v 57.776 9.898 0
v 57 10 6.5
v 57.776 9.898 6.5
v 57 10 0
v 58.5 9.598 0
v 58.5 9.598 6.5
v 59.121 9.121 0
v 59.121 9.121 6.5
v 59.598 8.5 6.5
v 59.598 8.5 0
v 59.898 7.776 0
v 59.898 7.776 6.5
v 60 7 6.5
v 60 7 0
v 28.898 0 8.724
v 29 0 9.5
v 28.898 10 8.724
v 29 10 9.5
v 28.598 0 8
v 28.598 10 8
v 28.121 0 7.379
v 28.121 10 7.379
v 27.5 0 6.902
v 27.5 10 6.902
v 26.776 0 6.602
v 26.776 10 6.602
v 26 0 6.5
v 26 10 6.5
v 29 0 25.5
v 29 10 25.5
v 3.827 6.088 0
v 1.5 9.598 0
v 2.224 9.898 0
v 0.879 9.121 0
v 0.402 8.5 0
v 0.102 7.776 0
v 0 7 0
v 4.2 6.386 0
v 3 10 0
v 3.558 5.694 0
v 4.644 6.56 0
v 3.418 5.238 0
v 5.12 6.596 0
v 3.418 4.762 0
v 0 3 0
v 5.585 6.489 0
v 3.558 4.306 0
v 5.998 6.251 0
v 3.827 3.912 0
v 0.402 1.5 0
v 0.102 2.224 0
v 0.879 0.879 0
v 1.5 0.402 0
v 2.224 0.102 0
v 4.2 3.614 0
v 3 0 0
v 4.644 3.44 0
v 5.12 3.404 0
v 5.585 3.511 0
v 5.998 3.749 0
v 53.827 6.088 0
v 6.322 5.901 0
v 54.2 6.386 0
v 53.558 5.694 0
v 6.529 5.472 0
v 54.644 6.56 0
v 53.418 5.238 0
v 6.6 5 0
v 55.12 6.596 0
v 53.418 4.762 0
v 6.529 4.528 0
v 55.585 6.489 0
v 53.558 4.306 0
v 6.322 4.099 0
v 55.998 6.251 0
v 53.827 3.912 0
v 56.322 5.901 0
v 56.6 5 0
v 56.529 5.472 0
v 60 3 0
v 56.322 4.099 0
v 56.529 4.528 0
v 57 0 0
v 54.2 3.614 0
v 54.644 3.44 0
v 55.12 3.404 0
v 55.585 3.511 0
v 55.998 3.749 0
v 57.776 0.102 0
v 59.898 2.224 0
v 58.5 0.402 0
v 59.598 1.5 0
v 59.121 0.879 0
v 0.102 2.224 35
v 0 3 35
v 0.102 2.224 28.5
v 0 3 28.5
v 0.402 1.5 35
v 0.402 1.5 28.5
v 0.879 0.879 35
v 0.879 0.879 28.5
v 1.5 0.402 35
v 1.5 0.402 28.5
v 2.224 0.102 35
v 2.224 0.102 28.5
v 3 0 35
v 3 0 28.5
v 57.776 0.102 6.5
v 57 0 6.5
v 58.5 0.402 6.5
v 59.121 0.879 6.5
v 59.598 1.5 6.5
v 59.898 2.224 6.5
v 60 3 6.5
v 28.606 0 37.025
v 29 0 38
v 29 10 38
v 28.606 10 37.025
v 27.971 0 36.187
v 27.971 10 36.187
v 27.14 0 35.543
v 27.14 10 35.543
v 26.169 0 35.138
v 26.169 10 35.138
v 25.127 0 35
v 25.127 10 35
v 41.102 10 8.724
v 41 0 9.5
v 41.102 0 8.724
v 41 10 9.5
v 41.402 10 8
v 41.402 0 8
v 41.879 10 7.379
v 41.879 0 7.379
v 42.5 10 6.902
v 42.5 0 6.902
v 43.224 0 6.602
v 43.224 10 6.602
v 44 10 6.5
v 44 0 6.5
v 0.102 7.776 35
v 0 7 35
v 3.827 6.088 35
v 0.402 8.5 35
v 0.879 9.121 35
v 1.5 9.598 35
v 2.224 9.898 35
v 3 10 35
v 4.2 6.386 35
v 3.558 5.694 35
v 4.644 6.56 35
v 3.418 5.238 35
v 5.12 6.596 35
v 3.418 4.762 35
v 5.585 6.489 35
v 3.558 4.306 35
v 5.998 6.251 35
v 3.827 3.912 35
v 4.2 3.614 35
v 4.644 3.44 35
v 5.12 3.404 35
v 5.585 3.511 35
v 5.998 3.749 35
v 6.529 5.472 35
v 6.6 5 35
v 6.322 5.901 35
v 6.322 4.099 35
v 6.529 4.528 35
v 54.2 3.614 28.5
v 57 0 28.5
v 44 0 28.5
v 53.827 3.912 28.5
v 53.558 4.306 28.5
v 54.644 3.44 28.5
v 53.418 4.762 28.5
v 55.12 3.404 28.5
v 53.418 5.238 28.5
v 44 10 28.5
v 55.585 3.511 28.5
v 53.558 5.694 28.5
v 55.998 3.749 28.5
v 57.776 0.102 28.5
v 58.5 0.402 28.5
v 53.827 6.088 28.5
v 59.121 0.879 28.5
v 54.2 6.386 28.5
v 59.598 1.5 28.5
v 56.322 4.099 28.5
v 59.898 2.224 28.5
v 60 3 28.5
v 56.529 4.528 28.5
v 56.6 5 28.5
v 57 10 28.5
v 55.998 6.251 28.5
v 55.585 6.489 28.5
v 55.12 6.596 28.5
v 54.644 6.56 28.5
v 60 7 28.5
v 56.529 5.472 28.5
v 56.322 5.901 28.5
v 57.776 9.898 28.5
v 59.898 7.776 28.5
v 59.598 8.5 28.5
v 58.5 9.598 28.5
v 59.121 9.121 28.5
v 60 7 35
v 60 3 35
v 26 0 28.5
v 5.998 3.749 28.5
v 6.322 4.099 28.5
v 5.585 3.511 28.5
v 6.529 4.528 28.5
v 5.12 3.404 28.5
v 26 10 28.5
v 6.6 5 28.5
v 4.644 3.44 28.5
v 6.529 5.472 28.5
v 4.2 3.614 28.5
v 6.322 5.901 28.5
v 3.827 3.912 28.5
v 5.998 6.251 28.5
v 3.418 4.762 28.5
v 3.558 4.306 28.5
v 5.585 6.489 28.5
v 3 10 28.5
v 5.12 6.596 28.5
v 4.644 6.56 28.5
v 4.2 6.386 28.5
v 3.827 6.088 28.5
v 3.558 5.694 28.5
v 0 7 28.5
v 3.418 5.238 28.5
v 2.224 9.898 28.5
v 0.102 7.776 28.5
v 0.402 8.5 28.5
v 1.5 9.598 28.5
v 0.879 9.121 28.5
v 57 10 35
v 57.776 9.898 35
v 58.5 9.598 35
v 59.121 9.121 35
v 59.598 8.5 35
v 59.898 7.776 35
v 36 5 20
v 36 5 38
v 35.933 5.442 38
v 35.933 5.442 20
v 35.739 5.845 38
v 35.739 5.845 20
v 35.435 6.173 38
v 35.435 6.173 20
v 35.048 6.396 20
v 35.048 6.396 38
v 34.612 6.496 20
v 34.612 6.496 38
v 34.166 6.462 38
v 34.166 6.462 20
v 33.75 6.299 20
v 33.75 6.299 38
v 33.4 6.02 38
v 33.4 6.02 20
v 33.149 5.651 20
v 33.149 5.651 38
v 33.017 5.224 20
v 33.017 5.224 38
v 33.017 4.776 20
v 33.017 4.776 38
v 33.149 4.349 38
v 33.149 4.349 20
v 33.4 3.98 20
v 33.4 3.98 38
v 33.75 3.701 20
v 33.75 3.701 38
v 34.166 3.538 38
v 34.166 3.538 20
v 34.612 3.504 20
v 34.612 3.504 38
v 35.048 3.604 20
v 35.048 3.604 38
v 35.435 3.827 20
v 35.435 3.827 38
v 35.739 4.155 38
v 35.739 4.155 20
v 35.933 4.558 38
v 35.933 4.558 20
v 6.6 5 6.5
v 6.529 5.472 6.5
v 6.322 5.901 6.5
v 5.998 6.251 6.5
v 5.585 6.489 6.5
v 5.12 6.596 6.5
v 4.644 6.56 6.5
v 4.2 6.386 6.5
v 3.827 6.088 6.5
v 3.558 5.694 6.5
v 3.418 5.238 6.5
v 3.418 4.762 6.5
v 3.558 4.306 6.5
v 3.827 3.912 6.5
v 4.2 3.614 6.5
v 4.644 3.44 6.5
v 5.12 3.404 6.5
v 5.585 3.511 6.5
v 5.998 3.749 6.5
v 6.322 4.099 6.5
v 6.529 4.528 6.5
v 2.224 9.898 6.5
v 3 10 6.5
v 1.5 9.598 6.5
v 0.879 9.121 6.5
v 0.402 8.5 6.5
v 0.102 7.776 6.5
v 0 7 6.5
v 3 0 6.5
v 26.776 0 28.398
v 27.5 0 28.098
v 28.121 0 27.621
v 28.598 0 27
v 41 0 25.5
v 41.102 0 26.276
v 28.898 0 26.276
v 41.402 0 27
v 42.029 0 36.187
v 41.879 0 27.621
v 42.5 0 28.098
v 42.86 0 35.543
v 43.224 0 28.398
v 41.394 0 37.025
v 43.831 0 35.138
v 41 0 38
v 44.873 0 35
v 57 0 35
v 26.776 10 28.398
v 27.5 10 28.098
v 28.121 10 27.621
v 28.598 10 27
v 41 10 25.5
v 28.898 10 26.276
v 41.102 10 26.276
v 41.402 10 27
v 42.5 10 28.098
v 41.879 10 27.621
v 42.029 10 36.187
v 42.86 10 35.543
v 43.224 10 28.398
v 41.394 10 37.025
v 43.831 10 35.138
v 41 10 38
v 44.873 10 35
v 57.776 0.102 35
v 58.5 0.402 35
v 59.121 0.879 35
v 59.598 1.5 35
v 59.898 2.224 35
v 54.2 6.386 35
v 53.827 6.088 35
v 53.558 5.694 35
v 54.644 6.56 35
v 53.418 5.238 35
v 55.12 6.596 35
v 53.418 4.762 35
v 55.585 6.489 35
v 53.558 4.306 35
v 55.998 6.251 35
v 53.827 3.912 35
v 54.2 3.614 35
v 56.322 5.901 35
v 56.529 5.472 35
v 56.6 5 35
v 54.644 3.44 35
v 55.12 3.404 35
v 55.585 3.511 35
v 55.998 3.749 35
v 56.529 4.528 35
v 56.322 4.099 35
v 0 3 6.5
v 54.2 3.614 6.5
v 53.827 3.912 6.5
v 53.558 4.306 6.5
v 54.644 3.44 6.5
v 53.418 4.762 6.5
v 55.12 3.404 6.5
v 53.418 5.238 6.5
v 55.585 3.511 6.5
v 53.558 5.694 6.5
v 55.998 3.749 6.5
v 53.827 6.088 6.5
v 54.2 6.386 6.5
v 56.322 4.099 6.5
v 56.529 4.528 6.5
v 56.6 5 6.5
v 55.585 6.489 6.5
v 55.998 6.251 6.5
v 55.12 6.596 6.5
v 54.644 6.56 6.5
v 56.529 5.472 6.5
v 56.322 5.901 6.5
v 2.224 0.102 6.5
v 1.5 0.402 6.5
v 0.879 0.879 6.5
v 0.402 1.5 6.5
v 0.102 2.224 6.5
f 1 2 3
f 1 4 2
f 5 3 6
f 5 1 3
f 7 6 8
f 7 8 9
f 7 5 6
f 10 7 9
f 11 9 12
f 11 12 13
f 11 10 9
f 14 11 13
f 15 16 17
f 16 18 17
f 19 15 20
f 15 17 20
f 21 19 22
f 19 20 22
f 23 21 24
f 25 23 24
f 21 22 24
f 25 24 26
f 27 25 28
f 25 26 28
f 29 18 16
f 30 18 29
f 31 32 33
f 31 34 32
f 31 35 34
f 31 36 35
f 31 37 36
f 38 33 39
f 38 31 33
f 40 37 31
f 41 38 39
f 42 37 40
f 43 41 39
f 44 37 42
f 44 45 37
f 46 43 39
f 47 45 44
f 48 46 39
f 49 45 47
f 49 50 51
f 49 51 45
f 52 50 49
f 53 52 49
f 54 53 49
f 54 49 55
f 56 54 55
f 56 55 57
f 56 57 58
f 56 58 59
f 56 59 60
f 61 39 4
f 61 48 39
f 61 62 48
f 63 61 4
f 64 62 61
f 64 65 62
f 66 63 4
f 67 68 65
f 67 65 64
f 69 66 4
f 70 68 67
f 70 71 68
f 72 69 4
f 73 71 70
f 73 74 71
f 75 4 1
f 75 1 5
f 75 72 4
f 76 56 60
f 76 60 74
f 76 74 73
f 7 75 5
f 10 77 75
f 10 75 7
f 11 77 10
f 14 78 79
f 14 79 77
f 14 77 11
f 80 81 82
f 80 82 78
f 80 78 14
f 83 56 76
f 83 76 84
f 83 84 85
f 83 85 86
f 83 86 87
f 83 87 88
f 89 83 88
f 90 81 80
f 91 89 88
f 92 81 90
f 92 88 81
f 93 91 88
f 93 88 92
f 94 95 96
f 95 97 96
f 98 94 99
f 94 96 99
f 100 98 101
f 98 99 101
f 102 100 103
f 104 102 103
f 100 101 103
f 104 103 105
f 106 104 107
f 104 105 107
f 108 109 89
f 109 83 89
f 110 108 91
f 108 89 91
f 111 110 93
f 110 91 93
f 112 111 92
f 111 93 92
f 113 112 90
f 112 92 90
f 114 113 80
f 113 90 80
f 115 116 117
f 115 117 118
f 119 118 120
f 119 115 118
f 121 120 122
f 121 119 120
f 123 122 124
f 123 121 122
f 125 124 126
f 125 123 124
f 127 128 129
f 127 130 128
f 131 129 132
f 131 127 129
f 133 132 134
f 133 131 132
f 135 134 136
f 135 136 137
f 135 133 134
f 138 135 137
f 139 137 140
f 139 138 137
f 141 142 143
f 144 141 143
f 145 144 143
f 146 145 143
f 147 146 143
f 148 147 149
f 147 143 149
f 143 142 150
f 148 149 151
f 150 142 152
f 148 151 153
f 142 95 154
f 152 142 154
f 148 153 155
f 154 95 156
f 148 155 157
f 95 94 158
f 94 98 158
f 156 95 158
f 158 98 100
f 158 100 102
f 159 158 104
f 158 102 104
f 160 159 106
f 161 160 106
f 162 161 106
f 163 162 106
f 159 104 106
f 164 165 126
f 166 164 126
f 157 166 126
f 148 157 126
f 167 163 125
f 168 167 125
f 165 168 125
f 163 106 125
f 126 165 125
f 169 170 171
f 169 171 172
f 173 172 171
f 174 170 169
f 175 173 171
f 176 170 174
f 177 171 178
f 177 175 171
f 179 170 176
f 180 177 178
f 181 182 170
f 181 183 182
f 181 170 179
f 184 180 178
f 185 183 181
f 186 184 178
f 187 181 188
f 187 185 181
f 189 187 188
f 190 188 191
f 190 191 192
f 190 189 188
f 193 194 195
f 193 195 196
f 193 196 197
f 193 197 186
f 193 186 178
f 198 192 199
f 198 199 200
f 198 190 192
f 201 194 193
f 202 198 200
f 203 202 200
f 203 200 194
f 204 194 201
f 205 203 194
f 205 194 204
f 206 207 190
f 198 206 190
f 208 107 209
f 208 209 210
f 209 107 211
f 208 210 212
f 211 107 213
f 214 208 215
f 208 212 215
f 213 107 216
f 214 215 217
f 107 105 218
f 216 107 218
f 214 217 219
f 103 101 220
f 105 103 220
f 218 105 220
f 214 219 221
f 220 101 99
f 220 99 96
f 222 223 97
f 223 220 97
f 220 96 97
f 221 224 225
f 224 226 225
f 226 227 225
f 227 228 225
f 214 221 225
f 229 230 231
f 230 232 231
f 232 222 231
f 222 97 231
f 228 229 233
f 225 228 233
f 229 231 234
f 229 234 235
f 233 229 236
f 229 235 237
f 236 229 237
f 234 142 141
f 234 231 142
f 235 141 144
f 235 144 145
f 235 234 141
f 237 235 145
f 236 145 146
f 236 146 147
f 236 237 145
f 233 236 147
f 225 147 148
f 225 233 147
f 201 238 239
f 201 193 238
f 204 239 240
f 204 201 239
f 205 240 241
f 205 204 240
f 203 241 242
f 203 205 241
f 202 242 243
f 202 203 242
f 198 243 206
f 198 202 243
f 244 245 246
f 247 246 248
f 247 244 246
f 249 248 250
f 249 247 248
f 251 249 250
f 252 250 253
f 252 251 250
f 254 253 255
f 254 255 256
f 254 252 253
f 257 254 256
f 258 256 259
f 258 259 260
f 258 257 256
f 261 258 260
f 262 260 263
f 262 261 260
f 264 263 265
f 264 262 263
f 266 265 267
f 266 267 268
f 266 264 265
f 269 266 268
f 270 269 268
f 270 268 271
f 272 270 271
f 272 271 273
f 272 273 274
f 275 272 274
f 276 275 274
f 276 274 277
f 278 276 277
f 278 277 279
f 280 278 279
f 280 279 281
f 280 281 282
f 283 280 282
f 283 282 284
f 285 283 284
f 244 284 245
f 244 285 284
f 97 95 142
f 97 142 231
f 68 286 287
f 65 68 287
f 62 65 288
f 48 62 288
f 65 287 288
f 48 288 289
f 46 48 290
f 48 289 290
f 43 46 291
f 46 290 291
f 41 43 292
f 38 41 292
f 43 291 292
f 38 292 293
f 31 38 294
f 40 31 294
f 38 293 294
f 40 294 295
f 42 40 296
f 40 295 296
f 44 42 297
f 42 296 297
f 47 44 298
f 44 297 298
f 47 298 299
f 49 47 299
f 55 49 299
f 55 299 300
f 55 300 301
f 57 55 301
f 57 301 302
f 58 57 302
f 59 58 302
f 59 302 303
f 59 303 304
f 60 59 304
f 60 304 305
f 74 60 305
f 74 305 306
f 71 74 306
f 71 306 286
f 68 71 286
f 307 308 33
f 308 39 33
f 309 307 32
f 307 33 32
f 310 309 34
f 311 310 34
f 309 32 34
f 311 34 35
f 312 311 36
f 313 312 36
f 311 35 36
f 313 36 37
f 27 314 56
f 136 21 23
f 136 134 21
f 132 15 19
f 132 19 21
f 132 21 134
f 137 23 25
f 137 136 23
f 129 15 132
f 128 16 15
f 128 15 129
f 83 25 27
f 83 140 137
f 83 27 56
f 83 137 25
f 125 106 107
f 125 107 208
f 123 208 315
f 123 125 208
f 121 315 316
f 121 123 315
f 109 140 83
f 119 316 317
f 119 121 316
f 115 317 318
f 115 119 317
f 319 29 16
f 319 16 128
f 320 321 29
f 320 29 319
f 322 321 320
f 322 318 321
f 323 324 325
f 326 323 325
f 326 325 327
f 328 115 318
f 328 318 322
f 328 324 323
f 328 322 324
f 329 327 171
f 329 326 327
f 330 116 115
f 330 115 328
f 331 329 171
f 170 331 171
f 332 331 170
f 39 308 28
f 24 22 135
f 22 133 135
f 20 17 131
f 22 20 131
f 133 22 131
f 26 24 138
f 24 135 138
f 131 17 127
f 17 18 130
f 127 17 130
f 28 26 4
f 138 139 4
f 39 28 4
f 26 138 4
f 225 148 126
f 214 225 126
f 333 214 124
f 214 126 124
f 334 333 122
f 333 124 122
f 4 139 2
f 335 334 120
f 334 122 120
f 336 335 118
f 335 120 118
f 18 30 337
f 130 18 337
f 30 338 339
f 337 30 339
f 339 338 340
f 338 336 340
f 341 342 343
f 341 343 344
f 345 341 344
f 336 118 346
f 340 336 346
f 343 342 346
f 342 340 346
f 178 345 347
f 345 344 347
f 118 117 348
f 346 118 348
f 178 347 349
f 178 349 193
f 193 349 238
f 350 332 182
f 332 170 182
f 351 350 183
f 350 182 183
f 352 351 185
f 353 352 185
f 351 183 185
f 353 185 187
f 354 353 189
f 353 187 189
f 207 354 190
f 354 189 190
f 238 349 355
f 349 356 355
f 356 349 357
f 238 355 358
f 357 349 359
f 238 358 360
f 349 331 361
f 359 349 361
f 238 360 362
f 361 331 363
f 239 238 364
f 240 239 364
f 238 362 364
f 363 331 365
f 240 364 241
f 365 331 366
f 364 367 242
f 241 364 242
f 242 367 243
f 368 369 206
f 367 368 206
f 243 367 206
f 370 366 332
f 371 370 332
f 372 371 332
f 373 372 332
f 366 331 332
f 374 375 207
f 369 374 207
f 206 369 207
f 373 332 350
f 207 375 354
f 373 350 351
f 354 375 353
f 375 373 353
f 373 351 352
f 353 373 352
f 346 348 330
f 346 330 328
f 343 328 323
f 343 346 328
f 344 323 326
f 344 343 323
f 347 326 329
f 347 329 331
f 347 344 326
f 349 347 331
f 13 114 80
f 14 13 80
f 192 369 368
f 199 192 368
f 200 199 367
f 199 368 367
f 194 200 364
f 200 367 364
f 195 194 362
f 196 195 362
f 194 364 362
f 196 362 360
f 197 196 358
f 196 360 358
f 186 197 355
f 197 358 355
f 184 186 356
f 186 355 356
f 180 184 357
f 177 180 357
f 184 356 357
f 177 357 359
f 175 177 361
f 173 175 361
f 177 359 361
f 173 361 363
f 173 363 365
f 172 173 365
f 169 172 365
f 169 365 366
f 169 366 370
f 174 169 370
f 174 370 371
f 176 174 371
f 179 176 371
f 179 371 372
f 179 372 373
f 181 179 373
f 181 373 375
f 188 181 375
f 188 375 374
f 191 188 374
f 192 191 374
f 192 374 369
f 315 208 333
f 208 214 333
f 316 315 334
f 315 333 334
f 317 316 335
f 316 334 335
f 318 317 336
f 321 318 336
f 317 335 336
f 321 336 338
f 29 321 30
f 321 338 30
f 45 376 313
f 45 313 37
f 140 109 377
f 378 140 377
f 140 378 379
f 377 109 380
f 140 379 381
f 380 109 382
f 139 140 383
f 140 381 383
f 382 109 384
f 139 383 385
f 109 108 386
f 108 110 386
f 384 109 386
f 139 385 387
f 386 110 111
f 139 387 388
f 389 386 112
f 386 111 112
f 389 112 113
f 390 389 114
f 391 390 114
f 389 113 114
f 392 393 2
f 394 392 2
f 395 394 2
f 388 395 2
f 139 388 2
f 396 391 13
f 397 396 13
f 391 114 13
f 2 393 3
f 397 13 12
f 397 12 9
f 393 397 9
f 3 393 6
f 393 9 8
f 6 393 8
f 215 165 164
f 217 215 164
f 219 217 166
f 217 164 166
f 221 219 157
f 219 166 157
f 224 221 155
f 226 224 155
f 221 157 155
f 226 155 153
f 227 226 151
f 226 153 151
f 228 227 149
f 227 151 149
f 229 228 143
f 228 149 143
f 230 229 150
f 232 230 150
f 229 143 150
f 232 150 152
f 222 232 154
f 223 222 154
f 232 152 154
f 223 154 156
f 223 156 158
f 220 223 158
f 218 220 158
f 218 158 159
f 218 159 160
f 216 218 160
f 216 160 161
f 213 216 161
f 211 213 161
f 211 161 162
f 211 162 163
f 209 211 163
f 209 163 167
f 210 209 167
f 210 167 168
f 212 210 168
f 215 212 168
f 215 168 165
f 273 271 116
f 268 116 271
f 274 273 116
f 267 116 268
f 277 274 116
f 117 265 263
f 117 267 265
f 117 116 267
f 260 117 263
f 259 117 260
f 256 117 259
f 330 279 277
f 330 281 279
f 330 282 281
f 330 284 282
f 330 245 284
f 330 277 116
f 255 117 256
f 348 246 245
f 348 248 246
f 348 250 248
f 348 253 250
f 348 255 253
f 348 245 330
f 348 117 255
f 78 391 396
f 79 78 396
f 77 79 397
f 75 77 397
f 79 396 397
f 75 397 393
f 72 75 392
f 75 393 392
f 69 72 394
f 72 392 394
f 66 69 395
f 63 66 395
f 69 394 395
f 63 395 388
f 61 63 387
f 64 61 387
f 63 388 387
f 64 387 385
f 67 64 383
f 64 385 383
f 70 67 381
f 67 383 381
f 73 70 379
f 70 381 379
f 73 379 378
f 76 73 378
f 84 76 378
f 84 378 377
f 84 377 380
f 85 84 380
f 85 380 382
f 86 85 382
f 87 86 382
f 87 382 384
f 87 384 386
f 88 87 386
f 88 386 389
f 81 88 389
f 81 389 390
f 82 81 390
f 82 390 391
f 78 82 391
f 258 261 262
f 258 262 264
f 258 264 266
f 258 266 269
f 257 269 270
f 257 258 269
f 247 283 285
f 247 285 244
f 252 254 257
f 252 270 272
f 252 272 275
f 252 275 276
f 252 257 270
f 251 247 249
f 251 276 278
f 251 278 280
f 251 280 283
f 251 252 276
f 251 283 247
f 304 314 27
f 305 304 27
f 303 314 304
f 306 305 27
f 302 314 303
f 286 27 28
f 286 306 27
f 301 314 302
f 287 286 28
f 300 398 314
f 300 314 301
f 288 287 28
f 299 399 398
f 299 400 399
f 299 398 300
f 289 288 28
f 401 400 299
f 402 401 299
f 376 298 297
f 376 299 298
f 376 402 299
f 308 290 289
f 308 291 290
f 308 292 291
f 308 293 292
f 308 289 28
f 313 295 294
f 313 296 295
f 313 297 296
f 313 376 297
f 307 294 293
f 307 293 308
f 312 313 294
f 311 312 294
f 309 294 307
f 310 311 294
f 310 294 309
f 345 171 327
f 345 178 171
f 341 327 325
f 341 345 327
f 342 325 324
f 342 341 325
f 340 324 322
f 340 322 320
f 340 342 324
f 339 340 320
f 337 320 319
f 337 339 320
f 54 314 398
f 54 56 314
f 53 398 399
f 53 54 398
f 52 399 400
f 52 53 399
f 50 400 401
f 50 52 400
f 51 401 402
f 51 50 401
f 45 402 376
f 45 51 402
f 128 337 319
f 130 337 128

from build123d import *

# Parameters (mm, degrees)
SKETCH1_W               = 60
SKETCH1_H               = 35
BOSS_EXTRUDE1_DEPTH     = 10
SKETCH2_W               = 22
SKETCH2_H               = 10
CUT_EXTRUDE1_DEPTH      = 19
SKETCH3_W               = 22
SKETCH3_H               = 10
CUT_EXTRUDE2_DEPTH      = 29
SKETCH5_R               = 1.6
CUT_EXTRUDE4_DEPTH      = 71.178344238
FILLET1_R               = 3
FILLET2_R               = 3
SKETCH7_W               = 12
SKETCH7_H               = 10
BOSS_EXTRUDE2_DEPTH     = 3
CUT_EXTRUDE5_DEPTH      = 3
CUT_EXTRUDE5_DEPTH_BACK = 15
SKETCH6_R               = 1.5
FILLET3_R               = 4


with BuildPart() as part:
    # Sketch1 → Boss-Extrude1 (new body)
    with BuildSketch(Plane(origin=(0, 0, 0), x_dir=(1, 0, 0), z_dir=(0, 1, 0))):
        with Locations((30, -17.5)):
            Rectangle(SKETCH1_W, SKETCH1_H)
    extrude(amount=BOSS_EXTRUDE1_DEPTH)

    # Sketch2 → Cut-Extrude1 (cut)
    with BuildSketch(Plane(origin=(60, 0, 0), x_dir=(0, 0, -1), z_dir=(1, 0, 0))):
        with Locations((-17.5, 5)):
            Rectangle(SKETCH2_W, SKETCH2_H)
    extrude(amount=-CUT_EXTRUDE1_DEPTH, mode=Mode.SUBTRACT)

    # Sketch3 → Cut-Extrude2 (cut)
    with BuildSketch(Plane.ZY):
        with Locations((17.5, 5)):
            Rectangle(SKETCH3_W, SKETCH3_H)
    extrude(amount=-CUT_EXTRUDE2_DEPTH, mode=Mode.SUBTRACT)

    # Sketch5 → Cut-Extrude4 (cut, through all)
    with BuildSketch(Plane.XY.offset(35)):
        with Locations((5, 5)):
            Circle(SKETCH5_R)
        with Locations((55, 5)):
            Circle(SKETCH5_R)
    extrude(amount=-CUT_EXTRUDE4_DEPTH, mode=Mode.SUBTRACT)

    # Fillet1
    fillet1_edges = [part.edges().sort_by_distance(p)[0] for p in [
        (60, 10, 31.75),
        (60, 0, 3.25),
        (60, 10, 3.25),
        (0, 0, 31.75),
        (0, 10, 31.75),
        (0, 10, 3.25),
        (60, 0, 31.75),
        (0, 0, 3.25),
    ]]
    fillet(fillet1_edges, radius=FILLET1_R)

    # Fillet2
    fillet2_edges = [part.edges().sort_by_distance(p)[0] for p in [
        (41, 5, 28.5),
        (41, 5, 6.5),
        (29, 5, 6.5),
        (29, 5, 28.5),
    ]]
    fillet(fillet2_edges, radius=FILLET2_R)

    # Sketch7 → Boss-Extrude2 (add)
    with BuildSketch(Plane.XY.offset(35)):
        with Locations((35, 5)):
            Rectangle(SKETCH7_W, SKETCH7_H)
    extrude(amount=BOSS_EXTRUDE2_DEPTH)

    # Sketch6 → Cut-Extrude5 (cut, two sides: drawn at the far end of the back side and taken through both)
    with BuildSketch(Plane.XY.offset(35).offset(-CUT_EXTRUDE5_DEPTH_BACK)):
        with Locations((34.5, 5)):
            Circle(SKETCH6_R)
    extrude(amount=CUT_EXTRUDE5_DEPTH + CUT_EXTRUDE5_DEPTH_BACK, mode=Mode.SUBTRACT)

    # Fillet3
    # the kernel refuses this fillet: 4 mm, written as the material it adds along each edge
    with BuildSketch(Plane(origin=(41, 10, 35), x_dir=(0, 0, 1), z_dir=(0, -1, 0))) as fillet3_piece_1:
        with BuildLine():
            CenterArc((4, -3.872983346), FILLET3_R, 104.477512186, 75.522487814)
            Line((0, -3.872983346), (-0.08, -3.872983346))
            Line((-0.08, -3.872983346), (-0.08, 0))
            Line((-0.08, 0), (0, 0.08))
            ThreePointArc((0, 0.08), (1.5, 0.08), (2.98, 0.077459667))
            Line((2.98, 0.077459667), (3, 0))
        make_face()
    extrude(amount=10)
    with BuildSketch(Plane(origin=(29, 0, 35), x_dir=(-1, 0, 0), z_dir=(0, 1, 0))) as fillet3_piece_2:
        with BuildLine():
            CenterArc((3.872983346, 4), FILLET3_R, 194.477512186, 75.522487814)
            Line((0, 3), (-0.077459667, 2.98))
            ThreePointArc((-0.077459667, 2.98), (-0.08, 1.5), (-0.08, 0))
            Line((-0.08, 0), (0, -0.08))
            Line((0, -0.08), (3.872983346, -0.08))
            Line((3.872983346, -0.08), (3.872983346, 0))
        make_face()
    extrude(amount=10)


solid = part.part
